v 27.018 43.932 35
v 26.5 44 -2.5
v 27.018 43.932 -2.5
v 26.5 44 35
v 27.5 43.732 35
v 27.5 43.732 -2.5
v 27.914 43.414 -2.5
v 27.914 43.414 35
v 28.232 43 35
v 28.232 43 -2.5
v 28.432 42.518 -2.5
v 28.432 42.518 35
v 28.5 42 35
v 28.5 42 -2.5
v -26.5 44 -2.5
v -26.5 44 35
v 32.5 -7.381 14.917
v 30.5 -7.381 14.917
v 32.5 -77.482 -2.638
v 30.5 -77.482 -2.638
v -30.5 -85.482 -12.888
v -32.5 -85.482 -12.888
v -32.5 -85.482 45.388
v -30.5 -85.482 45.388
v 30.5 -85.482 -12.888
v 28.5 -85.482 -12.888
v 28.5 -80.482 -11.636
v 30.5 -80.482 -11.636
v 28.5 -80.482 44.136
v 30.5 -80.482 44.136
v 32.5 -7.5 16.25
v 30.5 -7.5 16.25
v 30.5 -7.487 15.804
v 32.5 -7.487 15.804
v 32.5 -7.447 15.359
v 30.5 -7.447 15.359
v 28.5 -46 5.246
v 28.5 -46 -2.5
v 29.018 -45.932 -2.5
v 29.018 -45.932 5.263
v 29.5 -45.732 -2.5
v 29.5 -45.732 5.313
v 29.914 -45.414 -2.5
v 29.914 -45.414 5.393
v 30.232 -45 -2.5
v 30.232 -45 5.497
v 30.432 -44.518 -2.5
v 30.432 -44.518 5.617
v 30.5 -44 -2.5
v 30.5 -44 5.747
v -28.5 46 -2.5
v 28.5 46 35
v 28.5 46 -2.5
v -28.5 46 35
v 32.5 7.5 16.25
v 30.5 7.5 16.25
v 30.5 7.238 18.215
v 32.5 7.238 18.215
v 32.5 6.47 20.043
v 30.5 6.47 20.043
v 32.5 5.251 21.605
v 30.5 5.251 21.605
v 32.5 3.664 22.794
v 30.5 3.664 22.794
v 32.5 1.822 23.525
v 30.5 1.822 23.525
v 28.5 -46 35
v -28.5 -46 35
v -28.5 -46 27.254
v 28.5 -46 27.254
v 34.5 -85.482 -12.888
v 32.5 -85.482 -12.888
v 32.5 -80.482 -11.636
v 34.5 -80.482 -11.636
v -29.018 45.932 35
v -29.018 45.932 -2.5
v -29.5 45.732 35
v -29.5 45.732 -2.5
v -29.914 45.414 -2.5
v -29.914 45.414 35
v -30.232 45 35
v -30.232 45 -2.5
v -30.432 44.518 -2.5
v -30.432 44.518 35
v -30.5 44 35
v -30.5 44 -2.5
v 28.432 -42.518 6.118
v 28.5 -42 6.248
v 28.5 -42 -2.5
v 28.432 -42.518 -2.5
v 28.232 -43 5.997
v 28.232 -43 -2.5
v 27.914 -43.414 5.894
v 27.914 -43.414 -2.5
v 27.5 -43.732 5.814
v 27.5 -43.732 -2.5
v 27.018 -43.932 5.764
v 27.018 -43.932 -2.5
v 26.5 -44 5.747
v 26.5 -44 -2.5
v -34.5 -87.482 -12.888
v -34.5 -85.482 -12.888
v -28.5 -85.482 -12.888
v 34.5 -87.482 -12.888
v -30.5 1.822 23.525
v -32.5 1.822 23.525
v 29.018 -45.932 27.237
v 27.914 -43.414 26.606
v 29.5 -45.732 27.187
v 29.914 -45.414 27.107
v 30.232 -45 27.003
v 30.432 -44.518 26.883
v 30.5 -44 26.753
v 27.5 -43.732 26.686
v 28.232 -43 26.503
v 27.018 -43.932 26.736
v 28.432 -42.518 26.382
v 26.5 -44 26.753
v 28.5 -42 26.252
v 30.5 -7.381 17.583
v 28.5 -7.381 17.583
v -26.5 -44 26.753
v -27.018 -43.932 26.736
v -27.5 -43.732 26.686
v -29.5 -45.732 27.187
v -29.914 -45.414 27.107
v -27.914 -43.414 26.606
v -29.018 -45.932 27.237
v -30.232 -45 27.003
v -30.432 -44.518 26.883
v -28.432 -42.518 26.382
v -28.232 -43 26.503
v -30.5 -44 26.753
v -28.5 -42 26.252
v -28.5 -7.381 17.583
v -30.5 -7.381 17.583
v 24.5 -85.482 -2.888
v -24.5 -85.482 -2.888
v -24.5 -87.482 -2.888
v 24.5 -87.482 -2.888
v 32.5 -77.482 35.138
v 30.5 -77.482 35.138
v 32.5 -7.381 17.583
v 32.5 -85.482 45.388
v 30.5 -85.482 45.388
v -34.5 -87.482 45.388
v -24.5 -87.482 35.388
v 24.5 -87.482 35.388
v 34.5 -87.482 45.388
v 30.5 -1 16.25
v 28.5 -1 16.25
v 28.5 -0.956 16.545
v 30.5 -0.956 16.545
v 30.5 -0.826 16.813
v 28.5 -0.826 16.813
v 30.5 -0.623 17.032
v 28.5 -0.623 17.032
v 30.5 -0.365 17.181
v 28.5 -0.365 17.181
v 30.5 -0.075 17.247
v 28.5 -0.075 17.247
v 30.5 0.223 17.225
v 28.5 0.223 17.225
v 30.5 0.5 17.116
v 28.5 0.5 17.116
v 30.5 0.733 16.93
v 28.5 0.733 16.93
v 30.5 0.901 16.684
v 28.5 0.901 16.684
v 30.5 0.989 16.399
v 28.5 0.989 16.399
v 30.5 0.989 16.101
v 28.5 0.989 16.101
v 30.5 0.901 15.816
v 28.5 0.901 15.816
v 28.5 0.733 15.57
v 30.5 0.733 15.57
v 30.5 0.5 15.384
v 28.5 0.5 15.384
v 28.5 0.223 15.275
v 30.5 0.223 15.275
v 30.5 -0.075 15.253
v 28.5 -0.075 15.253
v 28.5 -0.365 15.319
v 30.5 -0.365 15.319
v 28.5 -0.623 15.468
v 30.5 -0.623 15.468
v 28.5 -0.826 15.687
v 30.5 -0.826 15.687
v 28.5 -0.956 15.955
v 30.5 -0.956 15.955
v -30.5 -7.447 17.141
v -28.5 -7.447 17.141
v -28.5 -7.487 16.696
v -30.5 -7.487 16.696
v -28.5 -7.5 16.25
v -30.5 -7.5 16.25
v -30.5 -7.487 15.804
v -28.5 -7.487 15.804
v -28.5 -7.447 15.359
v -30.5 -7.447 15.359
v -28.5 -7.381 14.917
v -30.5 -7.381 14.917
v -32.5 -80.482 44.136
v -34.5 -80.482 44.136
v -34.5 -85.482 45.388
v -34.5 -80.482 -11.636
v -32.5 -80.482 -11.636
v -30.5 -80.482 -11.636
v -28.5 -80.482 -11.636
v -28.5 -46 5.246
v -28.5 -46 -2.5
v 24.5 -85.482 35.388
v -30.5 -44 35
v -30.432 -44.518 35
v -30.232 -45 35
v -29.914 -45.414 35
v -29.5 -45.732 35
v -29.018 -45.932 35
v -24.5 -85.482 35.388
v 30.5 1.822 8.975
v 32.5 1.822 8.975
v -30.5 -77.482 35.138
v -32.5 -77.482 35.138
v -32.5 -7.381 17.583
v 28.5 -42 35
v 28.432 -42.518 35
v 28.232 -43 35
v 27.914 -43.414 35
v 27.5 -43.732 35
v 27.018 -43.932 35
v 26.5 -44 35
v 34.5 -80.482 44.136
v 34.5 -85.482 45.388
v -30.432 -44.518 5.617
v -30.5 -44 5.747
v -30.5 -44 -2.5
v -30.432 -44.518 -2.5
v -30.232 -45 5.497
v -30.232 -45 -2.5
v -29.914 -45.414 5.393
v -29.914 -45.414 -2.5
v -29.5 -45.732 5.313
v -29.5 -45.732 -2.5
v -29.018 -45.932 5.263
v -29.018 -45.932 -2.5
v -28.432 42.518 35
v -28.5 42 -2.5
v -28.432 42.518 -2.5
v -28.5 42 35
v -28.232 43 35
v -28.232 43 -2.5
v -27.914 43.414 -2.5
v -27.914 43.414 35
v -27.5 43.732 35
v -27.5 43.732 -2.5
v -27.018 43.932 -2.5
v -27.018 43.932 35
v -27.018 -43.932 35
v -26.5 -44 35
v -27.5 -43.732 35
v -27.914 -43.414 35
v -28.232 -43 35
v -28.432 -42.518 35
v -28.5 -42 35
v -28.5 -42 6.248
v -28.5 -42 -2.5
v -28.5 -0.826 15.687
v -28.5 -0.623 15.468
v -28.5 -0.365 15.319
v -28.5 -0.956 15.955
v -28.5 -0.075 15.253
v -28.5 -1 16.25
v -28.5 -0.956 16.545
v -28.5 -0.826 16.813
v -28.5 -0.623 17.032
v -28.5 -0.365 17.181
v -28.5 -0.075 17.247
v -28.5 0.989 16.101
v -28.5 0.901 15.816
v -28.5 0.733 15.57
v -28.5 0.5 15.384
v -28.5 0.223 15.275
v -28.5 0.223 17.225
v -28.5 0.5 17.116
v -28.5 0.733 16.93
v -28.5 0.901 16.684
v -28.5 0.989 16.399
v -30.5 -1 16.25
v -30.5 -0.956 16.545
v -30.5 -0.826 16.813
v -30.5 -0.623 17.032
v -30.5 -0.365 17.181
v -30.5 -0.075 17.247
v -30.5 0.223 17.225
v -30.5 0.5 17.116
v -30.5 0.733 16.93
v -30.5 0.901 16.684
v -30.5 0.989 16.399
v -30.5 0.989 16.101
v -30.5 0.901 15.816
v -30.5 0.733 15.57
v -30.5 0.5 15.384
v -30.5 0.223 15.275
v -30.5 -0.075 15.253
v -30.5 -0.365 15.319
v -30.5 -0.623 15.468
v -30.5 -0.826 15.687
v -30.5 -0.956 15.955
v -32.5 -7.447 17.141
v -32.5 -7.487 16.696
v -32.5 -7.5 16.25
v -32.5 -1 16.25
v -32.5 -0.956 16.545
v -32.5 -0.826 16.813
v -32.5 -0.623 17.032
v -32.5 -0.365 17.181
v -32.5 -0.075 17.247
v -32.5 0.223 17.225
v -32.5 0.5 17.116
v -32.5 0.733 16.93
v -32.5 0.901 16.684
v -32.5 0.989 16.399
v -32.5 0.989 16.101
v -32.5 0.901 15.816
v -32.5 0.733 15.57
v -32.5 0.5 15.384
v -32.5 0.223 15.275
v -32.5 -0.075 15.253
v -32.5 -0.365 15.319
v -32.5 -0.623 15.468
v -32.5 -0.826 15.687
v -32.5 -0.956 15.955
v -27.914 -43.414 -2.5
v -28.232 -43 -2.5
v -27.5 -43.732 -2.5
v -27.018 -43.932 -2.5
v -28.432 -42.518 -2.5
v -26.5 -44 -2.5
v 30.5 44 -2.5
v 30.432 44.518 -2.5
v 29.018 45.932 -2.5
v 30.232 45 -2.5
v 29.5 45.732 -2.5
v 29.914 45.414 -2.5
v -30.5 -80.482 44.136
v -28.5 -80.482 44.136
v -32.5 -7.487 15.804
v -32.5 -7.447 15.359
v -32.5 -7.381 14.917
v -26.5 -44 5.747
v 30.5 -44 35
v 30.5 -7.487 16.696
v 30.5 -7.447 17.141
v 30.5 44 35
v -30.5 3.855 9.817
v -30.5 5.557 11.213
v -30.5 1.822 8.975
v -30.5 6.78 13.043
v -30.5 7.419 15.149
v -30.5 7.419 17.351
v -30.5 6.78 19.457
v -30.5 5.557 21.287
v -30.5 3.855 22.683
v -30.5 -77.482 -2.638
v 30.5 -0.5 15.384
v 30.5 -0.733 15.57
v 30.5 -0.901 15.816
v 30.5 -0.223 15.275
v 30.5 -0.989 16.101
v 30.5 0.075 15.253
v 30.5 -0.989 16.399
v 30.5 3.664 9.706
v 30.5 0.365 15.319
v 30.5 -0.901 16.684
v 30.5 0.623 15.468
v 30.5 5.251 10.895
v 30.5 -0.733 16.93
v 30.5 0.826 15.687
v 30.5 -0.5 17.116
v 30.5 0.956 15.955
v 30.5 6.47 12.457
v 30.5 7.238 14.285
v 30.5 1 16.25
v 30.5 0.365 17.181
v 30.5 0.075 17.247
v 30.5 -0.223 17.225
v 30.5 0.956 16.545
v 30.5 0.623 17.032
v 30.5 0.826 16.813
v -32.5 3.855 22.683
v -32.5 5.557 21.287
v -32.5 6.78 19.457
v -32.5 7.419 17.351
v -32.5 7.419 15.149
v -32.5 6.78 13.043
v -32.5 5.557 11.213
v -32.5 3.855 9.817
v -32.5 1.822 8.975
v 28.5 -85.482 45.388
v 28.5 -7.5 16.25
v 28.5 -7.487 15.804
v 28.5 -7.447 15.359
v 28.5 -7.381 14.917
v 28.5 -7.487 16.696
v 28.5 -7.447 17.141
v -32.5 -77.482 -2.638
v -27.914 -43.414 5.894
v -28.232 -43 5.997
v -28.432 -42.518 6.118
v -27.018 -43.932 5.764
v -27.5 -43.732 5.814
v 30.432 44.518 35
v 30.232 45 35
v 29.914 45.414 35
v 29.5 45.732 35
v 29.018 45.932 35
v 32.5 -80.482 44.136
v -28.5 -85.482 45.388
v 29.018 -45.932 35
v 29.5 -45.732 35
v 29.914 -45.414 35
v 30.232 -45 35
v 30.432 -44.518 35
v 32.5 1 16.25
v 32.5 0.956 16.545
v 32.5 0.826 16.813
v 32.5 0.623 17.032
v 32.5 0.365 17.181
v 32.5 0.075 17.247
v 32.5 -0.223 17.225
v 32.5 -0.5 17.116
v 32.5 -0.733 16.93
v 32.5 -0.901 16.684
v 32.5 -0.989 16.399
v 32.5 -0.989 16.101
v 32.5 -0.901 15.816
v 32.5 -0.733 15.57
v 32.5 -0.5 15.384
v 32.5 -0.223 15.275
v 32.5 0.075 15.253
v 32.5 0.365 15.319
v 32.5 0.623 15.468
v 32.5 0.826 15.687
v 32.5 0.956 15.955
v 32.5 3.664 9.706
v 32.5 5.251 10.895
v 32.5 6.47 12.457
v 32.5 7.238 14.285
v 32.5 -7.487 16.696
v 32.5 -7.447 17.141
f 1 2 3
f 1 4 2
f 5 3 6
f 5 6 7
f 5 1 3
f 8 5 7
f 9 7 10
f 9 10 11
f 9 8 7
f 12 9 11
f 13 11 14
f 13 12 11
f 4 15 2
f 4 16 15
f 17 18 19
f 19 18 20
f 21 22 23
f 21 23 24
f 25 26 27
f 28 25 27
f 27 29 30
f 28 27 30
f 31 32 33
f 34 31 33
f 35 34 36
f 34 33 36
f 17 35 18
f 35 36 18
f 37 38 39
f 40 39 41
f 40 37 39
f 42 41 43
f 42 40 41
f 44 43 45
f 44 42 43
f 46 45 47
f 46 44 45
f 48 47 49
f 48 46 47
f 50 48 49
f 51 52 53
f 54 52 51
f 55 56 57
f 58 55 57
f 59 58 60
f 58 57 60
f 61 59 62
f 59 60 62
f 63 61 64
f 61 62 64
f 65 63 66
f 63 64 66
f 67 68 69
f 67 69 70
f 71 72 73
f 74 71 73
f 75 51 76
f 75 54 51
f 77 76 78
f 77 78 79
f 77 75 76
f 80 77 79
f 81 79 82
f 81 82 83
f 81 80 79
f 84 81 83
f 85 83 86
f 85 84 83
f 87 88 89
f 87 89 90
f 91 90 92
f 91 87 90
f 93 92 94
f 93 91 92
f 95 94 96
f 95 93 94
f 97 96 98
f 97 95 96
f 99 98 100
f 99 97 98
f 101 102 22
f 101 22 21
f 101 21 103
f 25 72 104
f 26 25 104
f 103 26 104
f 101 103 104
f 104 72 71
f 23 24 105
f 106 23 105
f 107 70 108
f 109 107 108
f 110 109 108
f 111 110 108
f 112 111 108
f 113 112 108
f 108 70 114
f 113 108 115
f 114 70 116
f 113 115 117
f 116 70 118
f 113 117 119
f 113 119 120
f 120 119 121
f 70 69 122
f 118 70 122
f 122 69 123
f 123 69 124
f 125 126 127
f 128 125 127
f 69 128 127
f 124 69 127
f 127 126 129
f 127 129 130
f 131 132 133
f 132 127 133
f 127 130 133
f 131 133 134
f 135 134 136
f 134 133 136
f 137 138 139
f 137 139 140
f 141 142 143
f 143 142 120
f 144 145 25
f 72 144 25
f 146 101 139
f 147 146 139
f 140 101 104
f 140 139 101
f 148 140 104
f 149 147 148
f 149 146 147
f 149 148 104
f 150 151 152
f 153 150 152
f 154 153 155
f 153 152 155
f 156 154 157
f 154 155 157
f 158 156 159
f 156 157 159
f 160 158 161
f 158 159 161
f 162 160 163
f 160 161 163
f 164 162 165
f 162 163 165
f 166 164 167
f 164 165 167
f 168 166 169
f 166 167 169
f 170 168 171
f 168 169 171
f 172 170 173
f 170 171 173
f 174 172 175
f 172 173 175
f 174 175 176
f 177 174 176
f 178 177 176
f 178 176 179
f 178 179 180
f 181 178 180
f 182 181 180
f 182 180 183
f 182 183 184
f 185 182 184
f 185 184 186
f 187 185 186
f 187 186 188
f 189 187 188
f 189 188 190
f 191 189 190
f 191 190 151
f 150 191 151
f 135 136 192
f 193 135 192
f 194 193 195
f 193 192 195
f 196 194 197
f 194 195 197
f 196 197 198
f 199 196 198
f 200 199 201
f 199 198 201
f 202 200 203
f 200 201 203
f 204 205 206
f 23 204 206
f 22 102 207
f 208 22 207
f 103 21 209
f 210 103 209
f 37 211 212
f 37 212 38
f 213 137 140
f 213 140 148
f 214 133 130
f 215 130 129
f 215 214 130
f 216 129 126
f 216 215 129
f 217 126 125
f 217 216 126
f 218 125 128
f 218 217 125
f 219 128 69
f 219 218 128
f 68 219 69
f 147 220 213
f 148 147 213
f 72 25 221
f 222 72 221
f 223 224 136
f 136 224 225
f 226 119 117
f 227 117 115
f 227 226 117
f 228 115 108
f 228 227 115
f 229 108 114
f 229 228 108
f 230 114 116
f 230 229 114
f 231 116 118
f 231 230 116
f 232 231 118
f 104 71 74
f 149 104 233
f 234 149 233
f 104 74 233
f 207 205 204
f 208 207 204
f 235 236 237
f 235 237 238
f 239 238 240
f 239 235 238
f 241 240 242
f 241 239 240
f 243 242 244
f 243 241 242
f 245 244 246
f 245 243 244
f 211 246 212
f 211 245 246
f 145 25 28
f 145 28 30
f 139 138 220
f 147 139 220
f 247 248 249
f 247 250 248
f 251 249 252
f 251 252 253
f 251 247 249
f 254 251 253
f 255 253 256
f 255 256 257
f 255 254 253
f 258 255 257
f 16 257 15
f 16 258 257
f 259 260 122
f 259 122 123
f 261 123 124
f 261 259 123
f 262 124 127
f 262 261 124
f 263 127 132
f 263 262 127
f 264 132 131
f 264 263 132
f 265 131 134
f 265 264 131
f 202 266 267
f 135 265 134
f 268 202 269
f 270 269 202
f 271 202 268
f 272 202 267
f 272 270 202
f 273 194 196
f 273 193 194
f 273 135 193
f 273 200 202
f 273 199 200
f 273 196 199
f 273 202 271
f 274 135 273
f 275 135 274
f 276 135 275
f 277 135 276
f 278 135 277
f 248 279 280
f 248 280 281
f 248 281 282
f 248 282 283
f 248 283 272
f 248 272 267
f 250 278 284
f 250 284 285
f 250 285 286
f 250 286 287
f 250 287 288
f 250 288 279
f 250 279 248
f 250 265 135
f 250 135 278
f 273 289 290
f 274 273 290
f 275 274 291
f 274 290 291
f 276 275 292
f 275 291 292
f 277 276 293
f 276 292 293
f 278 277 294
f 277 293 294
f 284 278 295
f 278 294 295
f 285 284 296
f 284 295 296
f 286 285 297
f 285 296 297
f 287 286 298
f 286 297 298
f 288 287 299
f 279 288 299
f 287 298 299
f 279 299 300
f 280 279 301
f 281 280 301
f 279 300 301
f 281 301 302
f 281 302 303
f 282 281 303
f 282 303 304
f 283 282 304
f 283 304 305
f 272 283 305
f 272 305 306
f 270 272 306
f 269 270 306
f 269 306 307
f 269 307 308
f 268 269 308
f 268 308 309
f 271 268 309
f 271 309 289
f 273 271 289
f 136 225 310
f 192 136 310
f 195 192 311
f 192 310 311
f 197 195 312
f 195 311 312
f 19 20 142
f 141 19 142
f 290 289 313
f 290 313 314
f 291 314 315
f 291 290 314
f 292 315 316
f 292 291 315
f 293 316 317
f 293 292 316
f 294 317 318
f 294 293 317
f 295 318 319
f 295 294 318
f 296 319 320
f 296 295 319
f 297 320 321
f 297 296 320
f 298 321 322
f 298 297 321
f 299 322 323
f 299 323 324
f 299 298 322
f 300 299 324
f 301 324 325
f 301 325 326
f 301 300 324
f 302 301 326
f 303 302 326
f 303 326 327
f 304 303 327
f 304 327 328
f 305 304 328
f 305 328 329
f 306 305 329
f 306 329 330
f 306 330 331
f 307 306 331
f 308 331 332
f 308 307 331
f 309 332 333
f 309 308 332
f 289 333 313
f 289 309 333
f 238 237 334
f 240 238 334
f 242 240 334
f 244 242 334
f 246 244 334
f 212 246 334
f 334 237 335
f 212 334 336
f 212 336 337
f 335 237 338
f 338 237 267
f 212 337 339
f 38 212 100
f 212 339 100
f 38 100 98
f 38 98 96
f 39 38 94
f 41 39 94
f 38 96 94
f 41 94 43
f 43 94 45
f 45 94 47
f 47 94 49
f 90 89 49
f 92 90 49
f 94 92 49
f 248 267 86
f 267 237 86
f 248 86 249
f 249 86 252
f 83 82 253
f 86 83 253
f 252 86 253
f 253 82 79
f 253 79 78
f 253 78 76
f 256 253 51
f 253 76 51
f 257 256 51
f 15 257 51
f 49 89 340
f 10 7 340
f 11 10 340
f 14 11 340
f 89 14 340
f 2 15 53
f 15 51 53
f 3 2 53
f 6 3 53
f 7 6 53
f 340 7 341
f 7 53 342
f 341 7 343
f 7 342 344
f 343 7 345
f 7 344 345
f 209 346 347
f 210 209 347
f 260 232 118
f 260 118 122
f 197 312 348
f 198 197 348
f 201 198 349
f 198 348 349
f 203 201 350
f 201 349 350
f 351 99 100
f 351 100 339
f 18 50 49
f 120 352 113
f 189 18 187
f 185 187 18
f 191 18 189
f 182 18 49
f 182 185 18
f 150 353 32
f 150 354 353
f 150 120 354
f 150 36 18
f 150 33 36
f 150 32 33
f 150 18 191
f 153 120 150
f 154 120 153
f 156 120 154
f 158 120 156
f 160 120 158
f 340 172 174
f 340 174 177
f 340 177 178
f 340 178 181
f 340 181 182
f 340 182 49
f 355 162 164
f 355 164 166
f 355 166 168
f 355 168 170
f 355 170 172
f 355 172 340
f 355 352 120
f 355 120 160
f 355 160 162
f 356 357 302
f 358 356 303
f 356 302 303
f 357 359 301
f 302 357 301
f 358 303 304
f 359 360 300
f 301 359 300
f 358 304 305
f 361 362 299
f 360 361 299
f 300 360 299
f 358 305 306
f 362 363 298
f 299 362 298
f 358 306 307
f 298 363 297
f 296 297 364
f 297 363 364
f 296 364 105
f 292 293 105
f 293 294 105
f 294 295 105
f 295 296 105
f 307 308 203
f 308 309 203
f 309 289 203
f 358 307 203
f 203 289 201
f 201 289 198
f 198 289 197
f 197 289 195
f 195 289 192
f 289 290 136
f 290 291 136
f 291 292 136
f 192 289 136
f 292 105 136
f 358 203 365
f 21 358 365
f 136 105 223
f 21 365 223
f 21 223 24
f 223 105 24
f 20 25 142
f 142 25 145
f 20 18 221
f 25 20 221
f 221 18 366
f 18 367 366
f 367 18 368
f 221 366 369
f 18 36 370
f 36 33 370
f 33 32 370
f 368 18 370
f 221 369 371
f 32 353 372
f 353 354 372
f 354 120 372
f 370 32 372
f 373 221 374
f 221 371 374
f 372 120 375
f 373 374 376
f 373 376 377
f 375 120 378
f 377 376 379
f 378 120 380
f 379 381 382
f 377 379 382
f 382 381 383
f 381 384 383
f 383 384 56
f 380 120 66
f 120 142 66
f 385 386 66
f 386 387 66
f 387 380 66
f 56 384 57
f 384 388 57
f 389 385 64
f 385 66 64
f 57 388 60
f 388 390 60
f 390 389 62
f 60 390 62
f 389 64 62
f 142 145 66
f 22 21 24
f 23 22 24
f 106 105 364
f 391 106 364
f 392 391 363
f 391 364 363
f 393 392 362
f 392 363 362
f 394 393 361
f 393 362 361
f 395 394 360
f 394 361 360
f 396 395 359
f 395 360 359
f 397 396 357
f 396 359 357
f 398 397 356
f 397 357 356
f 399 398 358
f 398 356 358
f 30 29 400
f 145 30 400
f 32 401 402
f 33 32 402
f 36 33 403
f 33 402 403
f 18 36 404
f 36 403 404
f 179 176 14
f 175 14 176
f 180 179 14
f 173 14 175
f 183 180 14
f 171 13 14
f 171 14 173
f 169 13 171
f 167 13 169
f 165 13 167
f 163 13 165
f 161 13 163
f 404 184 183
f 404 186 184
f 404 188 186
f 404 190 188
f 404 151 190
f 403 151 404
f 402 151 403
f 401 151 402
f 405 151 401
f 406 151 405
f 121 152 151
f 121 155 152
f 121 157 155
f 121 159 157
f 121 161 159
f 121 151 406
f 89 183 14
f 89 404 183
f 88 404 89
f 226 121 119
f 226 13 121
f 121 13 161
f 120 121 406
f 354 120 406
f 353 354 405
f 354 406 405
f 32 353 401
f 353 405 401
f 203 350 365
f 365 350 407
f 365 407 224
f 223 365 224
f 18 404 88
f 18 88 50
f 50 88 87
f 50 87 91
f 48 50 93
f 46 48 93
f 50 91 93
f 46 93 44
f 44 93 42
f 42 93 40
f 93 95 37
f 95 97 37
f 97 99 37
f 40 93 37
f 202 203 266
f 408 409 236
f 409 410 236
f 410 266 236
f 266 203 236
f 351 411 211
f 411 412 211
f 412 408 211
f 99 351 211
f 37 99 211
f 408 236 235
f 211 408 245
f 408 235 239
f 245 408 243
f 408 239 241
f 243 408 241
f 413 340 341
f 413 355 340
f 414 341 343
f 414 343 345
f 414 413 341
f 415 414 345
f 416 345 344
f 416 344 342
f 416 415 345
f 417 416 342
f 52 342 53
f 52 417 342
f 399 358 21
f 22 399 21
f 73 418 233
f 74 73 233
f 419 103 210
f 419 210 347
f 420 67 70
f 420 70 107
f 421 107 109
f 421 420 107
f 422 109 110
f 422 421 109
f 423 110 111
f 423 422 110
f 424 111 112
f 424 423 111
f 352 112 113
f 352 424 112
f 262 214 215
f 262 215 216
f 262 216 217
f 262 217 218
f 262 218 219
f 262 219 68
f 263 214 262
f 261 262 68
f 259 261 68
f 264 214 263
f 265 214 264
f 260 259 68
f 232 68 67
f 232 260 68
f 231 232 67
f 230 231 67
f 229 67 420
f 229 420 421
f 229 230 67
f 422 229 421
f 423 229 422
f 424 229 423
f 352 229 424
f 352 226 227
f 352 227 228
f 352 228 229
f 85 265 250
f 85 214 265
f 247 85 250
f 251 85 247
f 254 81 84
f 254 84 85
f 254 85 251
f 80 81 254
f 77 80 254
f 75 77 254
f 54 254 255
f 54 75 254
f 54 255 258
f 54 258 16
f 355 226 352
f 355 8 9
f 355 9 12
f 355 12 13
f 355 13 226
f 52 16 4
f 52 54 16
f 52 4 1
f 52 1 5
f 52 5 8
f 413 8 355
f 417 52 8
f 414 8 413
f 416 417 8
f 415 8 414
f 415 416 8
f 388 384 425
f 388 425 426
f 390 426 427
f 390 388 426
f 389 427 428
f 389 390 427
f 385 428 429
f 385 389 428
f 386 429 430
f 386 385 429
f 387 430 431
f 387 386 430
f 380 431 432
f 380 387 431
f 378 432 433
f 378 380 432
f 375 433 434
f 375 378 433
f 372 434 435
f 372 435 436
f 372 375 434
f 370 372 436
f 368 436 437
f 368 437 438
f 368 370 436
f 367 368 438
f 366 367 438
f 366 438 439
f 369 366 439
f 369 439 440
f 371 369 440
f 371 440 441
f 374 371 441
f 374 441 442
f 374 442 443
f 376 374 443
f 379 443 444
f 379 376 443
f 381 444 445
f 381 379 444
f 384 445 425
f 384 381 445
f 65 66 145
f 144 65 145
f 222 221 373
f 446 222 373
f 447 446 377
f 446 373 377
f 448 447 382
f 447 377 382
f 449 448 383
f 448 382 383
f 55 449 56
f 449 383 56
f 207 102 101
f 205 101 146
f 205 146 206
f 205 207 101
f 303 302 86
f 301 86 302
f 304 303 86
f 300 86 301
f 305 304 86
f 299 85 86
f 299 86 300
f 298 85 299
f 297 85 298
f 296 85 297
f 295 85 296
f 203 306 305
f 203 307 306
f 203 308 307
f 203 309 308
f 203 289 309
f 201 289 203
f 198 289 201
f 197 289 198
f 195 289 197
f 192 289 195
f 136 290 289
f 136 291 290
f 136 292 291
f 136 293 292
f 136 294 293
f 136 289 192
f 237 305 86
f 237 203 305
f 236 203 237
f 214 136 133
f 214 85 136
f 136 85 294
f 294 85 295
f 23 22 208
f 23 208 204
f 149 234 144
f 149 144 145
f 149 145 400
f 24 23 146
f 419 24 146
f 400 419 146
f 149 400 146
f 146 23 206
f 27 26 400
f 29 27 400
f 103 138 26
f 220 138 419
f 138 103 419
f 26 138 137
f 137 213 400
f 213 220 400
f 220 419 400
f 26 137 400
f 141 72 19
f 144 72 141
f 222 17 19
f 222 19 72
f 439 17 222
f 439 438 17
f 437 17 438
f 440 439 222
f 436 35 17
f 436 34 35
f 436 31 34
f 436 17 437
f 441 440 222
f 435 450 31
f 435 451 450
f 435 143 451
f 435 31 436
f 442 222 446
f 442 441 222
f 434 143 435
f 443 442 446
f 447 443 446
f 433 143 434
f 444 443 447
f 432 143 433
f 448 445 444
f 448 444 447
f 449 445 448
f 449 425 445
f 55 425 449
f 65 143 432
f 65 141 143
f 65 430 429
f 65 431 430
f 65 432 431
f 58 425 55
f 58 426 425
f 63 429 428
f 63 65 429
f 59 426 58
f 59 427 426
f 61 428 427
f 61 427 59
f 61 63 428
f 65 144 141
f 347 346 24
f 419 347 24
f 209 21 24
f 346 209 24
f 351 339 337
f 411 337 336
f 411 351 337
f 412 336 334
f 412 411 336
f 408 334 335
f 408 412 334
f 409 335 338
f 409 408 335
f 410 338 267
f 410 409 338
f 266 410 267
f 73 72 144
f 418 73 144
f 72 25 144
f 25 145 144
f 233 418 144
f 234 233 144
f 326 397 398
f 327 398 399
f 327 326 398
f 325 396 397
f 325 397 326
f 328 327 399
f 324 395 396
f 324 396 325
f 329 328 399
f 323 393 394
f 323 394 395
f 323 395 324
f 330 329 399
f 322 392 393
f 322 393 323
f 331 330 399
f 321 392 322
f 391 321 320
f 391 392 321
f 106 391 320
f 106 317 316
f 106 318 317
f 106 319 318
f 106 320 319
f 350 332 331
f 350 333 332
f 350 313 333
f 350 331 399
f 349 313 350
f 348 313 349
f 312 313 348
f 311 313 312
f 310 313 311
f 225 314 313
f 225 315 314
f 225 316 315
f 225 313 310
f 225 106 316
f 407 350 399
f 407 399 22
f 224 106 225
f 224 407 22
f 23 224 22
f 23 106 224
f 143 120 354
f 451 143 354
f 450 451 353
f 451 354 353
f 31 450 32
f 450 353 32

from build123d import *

# Parameters (mm, degrees)
F1_DEPTH      = 35
F1_DEPTH_BACK = 2.5
F2_R          = 1
F3_DEPTH      = 61.001
F5_R          = 1
F6_DEPTH      = 2
F8_R          = 1
F9_DEPTH      = 2
F10_W         = 2
F10_H         = 58.2758917019
F11_DEPTH     = 5
F10_W_2       = 57
F10_W_3       = 49
F10_H_2       = 38.2758917019
F12_DEPTH     = 2
F14_DEPTH     = 69.001
F16_DEPTH     = 67.001


with BuildPart() as f1:
    # F0 (on Top) → F1 (new body, two sides)
    with BuildSketch(Plane.XY) as f1_sk:
        with BuildLine():
            Line((-30.5, 44), (-30.5, 0))
            Line((-30.5, 0), (-30.5, -44))
            ThreePointArc((-30.5, -44), (-29.9142135624, -45.4142135624), (-28.5, -46))
            Line((-28.5, -46), (28.5, -46))
            ThreePointArc((28.5, -46), (29.9142135624, -45.4142135624), (30.5, -44))
            Line((30.5, -44), (30.5, 0))
            Line((30.5, 0), (30.5, 44))
            ThreePointArc((30.5, 44), (29.9142135624, 45.4142135624), (28.5, 46))
            Line((28.5, 46), (-28.5, 46))
            ThreePointArc((-28.5, 46), (-29.9142135624, 45.4142135624), (-30.5, 44))
        make_face()
        with BuildLine():
            Line((-28.5, -42), (-28.5, 0))
            Line((-28.5, 0), (-28.5, 42))
            ThreePointArc((-28.5, 42), (-27.9142135624, 43.4142135624), (-26.5, 44))
            Line((-26.5, 44), (26.5, 44))
            ThreePointArc((26.5, 44), (27.9142135624, 43.4142135624), (28.5, 42))
            Line((28.5, 42), (28.5, 0))
            Line((28.5, 0), (28.5, -42))
            ThreePointArc((28.5, -42), (27.9142135624, -43.4142135624), (26.5, -44))
            Line((26.5, -44), (10, -44))
            Line((10, -44), (9.5, -44))
            Line((9.5, -44), (-5.5, -44))
            Line((-5.5, -44), (-10, -44))
            Line((-10, -44), (-26.5, -44))
            ThreePointArc((-26.5, -44), (-27.9142135624, -43.4142135624), (-28.5, -42))
        make_face(mode=Mode.SUBTRACT)
    extrude(amount=F1_DEPTH)
    extrude(f1_sk.sketch, amount=-F1_DEPTH_BACK)

    # F2 (on face) → F3 (cut, through all)
    with BuildSketch(Plane(origin=(-30.5, 0, 0), x_dir=(0, -1, 0), z_dir=(-1, 0, 0))):
        with Locations((0, 16.25)):
            Circle(F2_R)
    extrude(amount=-F3_DEPTH, mode=Mode.SUBTRACT)


with BuildPart() as f6:
    # F5 (on offset) → F6 (new body)
    with BuildSketch(Plane(origin=(-30.5, 0, 0), x_dir=(0, -1, 0), z_dir=(-1, 0, 0))):
        Polygon((85.4823380096, 45.3879458509), (44, 35), (44, -2.5), (85.4823380096, -12.8879458509), align=None)
        with BuildLine():
            ThreePointArc((-1.8218828428, 23.5253517377), (4.6144273035, 22.1624496328), (7.5, 16.25))
            ThreePointArc((7.5, 16.25), (4.6144273035, 10.3375503672), (-1.8218828428, 8.9746482623))
            Line((-1.8218828428, 8.9746482623), (44, -2.5))
            Line((44, -2.5), (44, 35))
            Line((44, 35), (-1.8218828428, 23.5253517377))
        make_face()
        with BuildLine():
            ThreePointArc((-1.8218828428, 8.9746482623), (4.6144273035, 10.3375503672), (7.5, 16.25))
            ThreePointArc((7.5, 16.25), (4.6144273035, 22.1624496328), (-1.8218828428, 23.5253517377))
            ThreePointArc((-1.8218828428, 23.5253517377), (-7.5, 16.25), (-1.8218828428, 8.9746482623))
        make_face()
        with Locations((0, 16.25)):
            Circle(F5_R, mode=Mode.SUBTRACT)
    extrude(amount=F6_DEPTH)


with BuildPart() as f9:
    # F8 (on offset) → F9 (new body)
    with BuildSketch(Plane.YZ.offset(30.5)):
        with BuildLine():
            ThreePointArc((1.8218828428, 8.9746482623), (-7.5, 16.25), (1.8218828428, 23.5253517377))
            Line((1.8218828428, 23.5253517377), (-85.4823380096, 45.3879458509))
            Line((-85.4823380096, 45.3879458509), (-85.4823380096, -12.8879458509))
            Line((-85.4823380096, -12.8879458509), (1.8218828428, 8.9746482623))
        make_face()
        with BuildLine():
            ThreePointArc((7.5, 16.25), (5.9124496328, 20.8644273035), (1.8218828428, 23.5253517377))
            ThreePointArc((1.8218828428, 23.5253517377), (-7.5, 16.25), (1.8218828428, 8.9746482623))
            ThreePointArc((1.8218828428, 8.9746482623), (5.9124496328, 11.6355726965), (7.5, 16.25))
        make_face()
        with Locations((0, 16.25)):
            Circle(F8_R, mode=Mode.SUBTRACT)
    extrude(amount=F9_DEPTH)


with BuildPart() as f11:
    # F10 (on face) → F11 (new body)
    with BuildSketch(Plane.XZ.offset(85.4823380096)):
        with Locations((33.5, 16.25)):
            Rectangle(F10_W, F10_H)
        with Locations((29.5, 16.25)):
            Rectangle(F10_W, F10_H)
        with Locations((-29.5, 16.25)):
            Rectangle(F10_W, F10_H)
        with Locations((-33.5, 16.25)):
            Rectangle(F10_W, F10_H)
    extrude(amount=-F11_DEPTH)

    # F10 (on face) → F12 (join)
    with BuildSketch(Plane.XZ.offset(85.4823380096)):
        with Locations((33.5, 16.25)):
            Rectangle(F10_W, F10_H)
        with Locations((31.5, 16.25)):
            Rectangle(F10_W, F10_H)
        with Locations((0, 16.25)):
            Rectangle(F10_W_2, F10_H)
        with Locations((0, 16.25)):
            Rectangle(F10_W_3, F10_H_2, mode=Mode.SUBTRACT)
        with Locations((-29.5, 16.25)):
            Rectangle(F10_W, F10_H)
        with Locations((-31.5, 16.25)):
            Rectangle(F10_W, F10_H)
        with Locations((-33.5, 16.25)):
            Rectangle(F10_W, F10_H)
        with Locations((29.5, 16.25)):
            Rectangle(F10_W, F10_H)
    extrude(amount=F12_DEPTH)

    # F13 (on face) → F14 (cut, through all)
    with BuildSketch(Plane(origin=(-34.5, 0, 0), x_dir=(0, -1, 0), z_dir=(-1, 0, 0))):
        Polygon((85.4823380096, -12.8879458509), (80.4823380096, -11.6358532316), (80.4823380096, -12.8879458509), align=None)
        Polygon((80.4823380096, 45.3879458509), (80.4823380096, 44.1358532316), (85.4823380096, 45.3879458509), align=None)
    extrude(amount=-F14_DEPTH, mode=Mode.SUBTRACT)


with BuildPart() as f16_tool:
    # F15 (on face) → F16 (new body, through all)
    with BuildSketch(Plane(origin=(-32.5, 0, 0), x_dir=(0, -1, 0), z_dir=(-1, 0, 0))):
        with BuildLine():
            ThreePointArc((7.3806251417, 17.5828062565), (7.4700966715, 16.9190707874), (7.5, 16.25))
            ThreePointArc((7.5, 16.25), (7.4700966715, 15.5809292126), (7.3806251417, 14.9171937435))
            Line((7.3806251417, 14.9171937435), (77.4823380096, -2.6375737135))
            Line((77.4823380096, -2.6375737135), (77.4823380096, 35.1375737135))
            Line((77.4823380096, 35.1375737135), (7.3806251417, 17.5828062565))
        make_face()
    extrude(amount=-F16_DEPTH)


with BuildPart() as f1_1:
    add(f1.part)

    # F16: cut by f16_tool
    add(f16_tool.part, mode=Mode.SUBTRACT)


with BuildPart() as f6_1:
    add(f6.part)

    # F16: cut by f16_tool
    add(f16_tool.part, mode=Mode.SUBTRACT)


with BuildPart() as f9_1:
    add(f9.part)

    # F16: cut by f16_tool
    add(f16_tool.part, mode=Mode.SUBTRACT)


solid = Compound([f11.part, f1_1.part, f6_1.part, f9_1.part])
